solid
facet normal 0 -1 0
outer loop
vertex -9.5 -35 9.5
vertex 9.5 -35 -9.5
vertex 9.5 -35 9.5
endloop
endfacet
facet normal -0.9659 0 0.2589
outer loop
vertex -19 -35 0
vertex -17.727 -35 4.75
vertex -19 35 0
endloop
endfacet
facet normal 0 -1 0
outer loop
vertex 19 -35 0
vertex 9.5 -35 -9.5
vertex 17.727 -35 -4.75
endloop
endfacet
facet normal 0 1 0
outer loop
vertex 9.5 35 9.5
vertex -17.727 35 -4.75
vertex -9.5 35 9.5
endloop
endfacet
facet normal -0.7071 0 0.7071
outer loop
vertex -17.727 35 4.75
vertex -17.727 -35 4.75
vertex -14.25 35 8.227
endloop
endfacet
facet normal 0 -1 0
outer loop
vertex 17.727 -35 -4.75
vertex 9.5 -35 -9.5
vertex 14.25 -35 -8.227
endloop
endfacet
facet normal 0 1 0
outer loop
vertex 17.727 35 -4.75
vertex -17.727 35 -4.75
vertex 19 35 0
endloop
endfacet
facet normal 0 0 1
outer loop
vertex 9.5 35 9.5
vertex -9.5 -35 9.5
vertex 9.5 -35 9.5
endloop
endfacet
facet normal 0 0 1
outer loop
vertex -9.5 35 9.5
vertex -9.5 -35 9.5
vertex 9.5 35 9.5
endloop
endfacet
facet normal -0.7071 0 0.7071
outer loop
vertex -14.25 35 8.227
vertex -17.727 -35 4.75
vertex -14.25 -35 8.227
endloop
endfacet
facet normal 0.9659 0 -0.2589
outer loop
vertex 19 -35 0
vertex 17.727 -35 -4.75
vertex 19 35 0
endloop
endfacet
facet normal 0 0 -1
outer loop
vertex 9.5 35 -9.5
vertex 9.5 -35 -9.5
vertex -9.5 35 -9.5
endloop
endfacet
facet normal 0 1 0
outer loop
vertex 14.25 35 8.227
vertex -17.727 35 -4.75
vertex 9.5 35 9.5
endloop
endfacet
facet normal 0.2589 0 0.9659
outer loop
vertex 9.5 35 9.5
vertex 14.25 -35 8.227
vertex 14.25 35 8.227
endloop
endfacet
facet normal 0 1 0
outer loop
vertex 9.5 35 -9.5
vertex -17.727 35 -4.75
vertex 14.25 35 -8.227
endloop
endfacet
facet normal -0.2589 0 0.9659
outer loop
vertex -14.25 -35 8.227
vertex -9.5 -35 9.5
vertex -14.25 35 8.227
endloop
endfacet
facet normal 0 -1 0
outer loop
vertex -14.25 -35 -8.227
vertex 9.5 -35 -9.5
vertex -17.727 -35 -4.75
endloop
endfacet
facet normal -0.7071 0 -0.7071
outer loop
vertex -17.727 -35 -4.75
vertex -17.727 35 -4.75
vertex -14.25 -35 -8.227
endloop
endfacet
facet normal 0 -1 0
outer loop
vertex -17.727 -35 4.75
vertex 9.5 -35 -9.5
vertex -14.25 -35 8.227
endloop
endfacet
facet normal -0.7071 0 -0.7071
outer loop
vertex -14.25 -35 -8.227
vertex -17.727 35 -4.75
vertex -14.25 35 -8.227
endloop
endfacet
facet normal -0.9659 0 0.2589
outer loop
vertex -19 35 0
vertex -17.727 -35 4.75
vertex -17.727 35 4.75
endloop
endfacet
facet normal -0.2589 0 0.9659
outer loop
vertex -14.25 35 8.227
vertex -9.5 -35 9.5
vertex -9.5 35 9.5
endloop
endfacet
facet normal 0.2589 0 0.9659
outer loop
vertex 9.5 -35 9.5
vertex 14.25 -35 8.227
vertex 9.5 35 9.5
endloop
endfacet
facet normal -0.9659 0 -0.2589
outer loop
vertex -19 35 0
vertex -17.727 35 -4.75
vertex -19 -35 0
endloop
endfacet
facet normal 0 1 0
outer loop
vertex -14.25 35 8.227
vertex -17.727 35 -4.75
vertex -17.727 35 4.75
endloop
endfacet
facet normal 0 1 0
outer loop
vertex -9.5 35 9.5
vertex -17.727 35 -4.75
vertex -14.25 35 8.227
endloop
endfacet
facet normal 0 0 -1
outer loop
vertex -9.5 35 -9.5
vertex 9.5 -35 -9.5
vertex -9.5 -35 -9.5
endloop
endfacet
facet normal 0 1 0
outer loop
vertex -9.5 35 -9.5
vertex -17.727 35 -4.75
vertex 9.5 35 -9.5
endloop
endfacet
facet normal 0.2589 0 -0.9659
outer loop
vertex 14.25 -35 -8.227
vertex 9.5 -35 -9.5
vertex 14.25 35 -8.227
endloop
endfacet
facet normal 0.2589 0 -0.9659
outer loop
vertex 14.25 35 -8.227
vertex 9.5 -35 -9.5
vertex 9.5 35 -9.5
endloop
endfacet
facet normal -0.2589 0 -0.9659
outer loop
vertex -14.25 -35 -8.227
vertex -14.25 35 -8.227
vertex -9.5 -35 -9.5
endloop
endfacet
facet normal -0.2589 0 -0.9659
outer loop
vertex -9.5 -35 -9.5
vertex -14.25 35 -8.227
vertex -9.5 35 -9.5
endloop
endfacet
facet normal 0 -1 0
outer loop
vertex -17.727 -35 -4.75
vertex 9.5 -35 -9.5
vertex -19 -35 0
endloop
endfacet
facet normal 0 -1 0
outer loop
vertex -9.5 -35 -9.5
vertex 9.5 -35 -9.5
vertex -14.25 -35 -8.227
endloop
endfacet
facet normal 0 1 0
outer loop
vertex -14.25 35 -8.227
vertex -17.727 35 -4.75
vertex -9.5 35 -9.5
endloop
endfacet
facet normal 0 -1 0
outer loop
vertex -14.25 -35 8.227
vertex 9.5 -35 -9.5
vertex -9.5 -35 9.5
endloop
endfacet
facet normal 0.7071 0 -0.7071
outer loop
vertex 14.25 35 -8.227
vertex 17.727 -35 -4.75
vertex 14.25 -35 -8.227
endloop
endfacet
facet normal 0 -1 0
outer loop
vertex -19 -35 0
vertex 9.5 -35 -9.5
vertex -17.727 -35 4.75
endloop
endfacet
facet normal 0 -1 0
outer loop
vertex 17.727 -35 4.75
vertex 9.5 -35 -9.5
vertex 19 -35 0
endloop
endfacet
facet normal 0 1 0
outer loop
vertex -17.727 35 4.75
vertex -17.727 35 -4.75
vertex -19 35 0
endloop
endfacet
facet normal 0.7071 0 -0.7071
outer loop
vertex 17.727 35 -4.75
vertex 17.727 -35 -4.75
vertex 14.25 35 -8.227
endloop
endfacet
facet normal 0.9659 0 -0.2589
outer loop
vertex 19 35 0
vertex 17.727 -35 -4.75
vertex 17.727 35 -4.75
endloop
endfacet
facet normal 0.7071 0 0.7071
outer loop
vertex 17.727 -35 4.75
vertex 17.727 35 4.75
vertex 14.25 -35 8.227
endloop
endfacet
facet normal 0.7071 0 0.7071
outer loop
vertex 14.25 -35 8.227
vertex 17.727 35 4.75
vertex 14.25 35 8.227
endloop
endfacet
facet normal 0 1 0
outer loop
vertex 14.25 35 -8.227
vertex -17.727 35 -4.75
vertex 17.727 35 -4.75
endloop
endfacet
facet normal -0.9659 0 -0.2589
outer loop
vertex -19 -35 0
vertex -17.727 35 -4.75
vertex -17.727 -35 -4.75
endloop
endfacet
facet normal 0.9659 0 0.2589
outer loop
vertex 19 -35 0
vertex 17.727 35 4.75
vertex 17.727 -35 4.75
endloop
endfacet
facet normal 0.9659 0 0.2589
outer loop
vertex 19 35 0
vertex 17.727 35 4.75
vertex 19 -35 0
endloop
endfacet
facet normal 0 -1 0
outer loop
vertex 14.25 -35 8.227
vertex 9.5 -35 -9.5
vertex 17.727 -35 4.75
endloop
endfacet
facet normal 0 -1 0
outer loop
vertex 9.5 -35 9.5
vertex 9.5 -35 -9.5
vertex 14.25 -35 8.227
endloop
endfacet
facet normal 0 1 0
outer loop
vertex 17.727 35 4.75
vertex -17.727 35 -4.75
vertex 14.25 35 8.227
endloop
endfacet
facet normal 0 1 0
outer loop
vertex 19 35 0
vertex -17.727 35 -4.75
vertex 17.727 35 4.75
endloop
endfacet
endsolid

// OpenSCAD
$fn=12;

module MMMotor(){
    $fn=12;
    translate([0,-12/2,-10/2]){
        cube([9.5,12,10]);
        intersection(){
            cube([9+15,12,10]);
            rotate([0,90,0]){
                translate([-10/2,12/2,0]){
                    cylinder(9+15,d=12);
                }
            }
        }
    }
    rotate([0,270,0]){
        cylinder(9,d=4);
        cylinder(2,d=6);
    }
    rotate([0,90,0]){
        cylinder(9+15+2,d=6);
        cylinder(9+15+4.5,d=2);
    }
    translate([9+15,-12/2-6,-10/2]){
        hull(){
            cube([1.6,18,10]);
            translate([-2,-(18-18),0]){
                cube([12,18+6,15]);
            }
            translate([-2,(18+6)/2,20]){
                rotate([0,90,0]){
                    cylinder(12,d=18+9.5,$fn=6);
                }
            }
        }
    }
}
module IMU(){
    x=.8*25.4;  //convert from In to mm
    y=.5*25.4;  //Convert form In to mm
    z=1.6;      //already in MM no conversion necessary
    b=.1*25.4;   //Boarder In to MM
    translate ([-x/2,-y/2,0]){
        minkowski(){
            cube([x,y,z]);
            cylinder(z,r=b);
        }
        translate([0,0,-10]){
            translate([0,0,0]){
                cylinder(20,d=2.5);
            }
            translate([x,0,0]){
                cylinder(20,d=2.5);
            }
            translate([x,y,0]){
                cylinder(20,d=2.5);
            }
            translate([0,y,0]){
                cylinder(20,d=2.5);
            }
        }
      
    }
}
module LiPo(x=68,y=34,z=9,b=0){
    x=x+b*2;
    y=y+b*2;
    
    translate([-x/2,-y/2,.25]){
        cube([x,y,z]);
    }
}
module LiPo2(){
    rotate([90,0,0]){
        translate([0,0,-70/2]){
            hull(){
                translate([-19/2,0,0]){
                    cylinder(70,d=19);
                }
                translate([19/2,0,0]){
                    cylinder(70,d=19);
                }
            }
        }
    }
}
module Spacer(h=12,o=7,i=3){
    difference(){
        cylinder(h,d=o,$fn=6);
        cylinder(h,d=i,$fn=12);
    }
}
module Mecanum(Angle=45){
    
    rotate([0,270,0]){
        cylinder(2,d=35);
        translate([0,0,22]){
            cylinder(2,d=35);
        }
    
        for (x = [0:6]){
            rotate([0,0,(360/6)*x]){
                translate([(35/2)-2,0,24/2]){
                    rotate([Angle,0,0]){
                        translate([0,0,-24/2]){
                            cylinder(24,d=8);
                        }
                    }
                }
            }
        }
    }
}
 module MotorMountH(){
    translate([15/2-2,0,-15/2+1.5]){
         rotate([0,0,270]){
            difference(){
                union(){
                     translate([-30/2,-15/2,0]){
                         cube([30,15,3]);
                     }
                     translate([-17/2,-15/2,0]){
                         cube([17,15,13]);
                     }
                }
                rotate([0,0,90]){
                    translate([-15/2+2,0,15/2-2.5]){
                        MMMotor();
                    }
                    translate([-10/2,-12/2,-3]){
                            cube([15,12,10]);
                    }
                }
                translate([-10,0,0]){
                    cylinder(25,d=3);
                    translate([0,0,2]){
                        rotate([0,0,90]){
                            cylinder(20,d=6,$fn=6);
                        }
                    }
                }
                translate([10,0,0]){
                    cylinder(25,d=3);
                    translate([0,0,2]){
                        rotate([0,0,90]){
                            cylinder(20,d=6,$fn=6);
                        }
                    }
                }
            }
         }
     }
 } 
 module MotorMountV(){
    translate([15/2-2,0,-15/2+1.5]){
         rotate([0,0,270]){
            difference(){
                union(){
                     translate([-30/2,-15/2,0]){
                         cube([30,15,3]);
                     }
                     translate([-15/2,-15/2,0]){
                         cube([15,15,15]);
                     }
                }
                rotate([90,0,90]){
                    translate([-6,15/2-1.5,0]){
                        MMMotor();
                    }
                    translate([-4,-10,-10/2]){
                            cube([13,15,10]);
                    }
                }
                translate([-10,0,0]){
                    cylinder(5,d=3);
                    translate([0,0,2]){
                        rotate([0,0,90]){
                            cylinder(20,d=6,$fn=6);
                        }
                    }
                }
                translate([10,0,0]){
                    cylinder(5,d=3);
                    translate([0,0,2]){
                        rotate([0,0,90]){
                            cylinder(20,d=6,$fn=6);
                        }
                    }
                }
            }
         }
     }
 }
module MotorMountF(T=3){
    translate([15.5/2-2.25,0,-6]){
        rotate([0,0,90]){
            translate([-20/2,0,-10]){
                cylinder(15,d=3);
                translate([0,0,-T]){
                    cylinder(10,d=6);
                }
               translate([20,0,0]){
                    cylinder(15,d=3);
                    translate([0,0,-T]){
                        cylinder(10,d=6);
                    }
               }
           }
           
           translate([-30.5/2,-15.5/2,0]){
               cube([30.5,15.5,1.5]);
           }
        }
    }
}
module BatBox4AA(){
    x=65;
    y=68;
    z=16;
    translate([-x/2+3.5,-y/2,0]){
        minkowski(){
            cube([x-3.5*2,y,z-3.5*2]);
            rotate([-90,0,0]){
                cylinder(.01,r=3.5);
            }

        }
    }
    translate([-(x-6)/2,-(y-8)/2,0]){
        cube([(x-6)/2-2,y-8,z+5]);
    }
    translate([2,-(y-8)/2,0]){
        cube([(x-6)/2-2,y-8,z+5]);
    }
}
module Battery(){
    rotate([-90,0,0]){
        translate([-(26-16)/2,-(22-16)/2,-105/2]){
            minkowski(){
                cube([26-16,22-16,105]);
                cylinder(105,r=8);
            }
        }
    }
}
module Switch(){
    translate([0,0,-2]){
        cylinder (9,d=6);
        cylinder (2,d=12);
        translate ([0,6,0]){
            cylinder(3.5,d=2.5);
        }
        translate([-8/2,-13/2,-14]){
            cube([8,13,14]);
        }
        
    }
    translate([0,9,3]){
        linear_extrude(5){
          text("OFF",size=4, font = "Liberation Sans:sytle='bold'",halign="center",valign="center");
        }
    }
    translate([0,-9,3]){
        linear_extrude(5){
          text("ON",size=4, font = "Liberation Sans:sytle='bold'",halign="center",valign="center");
        }
    }
}
module SR04(){
    translate([-45.5/2,-20.5/2,-12]){
        cube([45.5,20.5,12]);
    }
    translate([-14/2,5.25,0]){
        cube([14,5,4]);
    }
    translate([-14/2,-20.5/2,-10]){
        cube([14,5,14]);
    }
    translate([-26/2,0,0]){
        cylinder(13,d=17);
    }
    translate([26/2,0,0]){
        cylinder(13,d=17);
    }
}
module MP2636(){
    translate([0,0,-10]){
        cylinder(20,d=3.5,$fn=12);
    }
    translate([-4,-4,0]){
        cube([35.5,30.5,1.6]);
    }
    translate([4,-4,0]){
        cube([20,30.5,4]);
    }
    translate([12,27,0]){
        cylinder(15,d=10);
        translate([-1,0,0]){
            cube([2,10,15]);
        }
    }
    
}    
LiPo2();
//MP2636();
//Battery();
//BatBox4AA();
//MotorMountH();
//MotorMountF();
//Mecanum(Angle=-45);
//rotate([90,0,0]){
//    MMMotor();
//}
//IMU(); 
//Spacer(h=3,i=2.5);
//Switch();
